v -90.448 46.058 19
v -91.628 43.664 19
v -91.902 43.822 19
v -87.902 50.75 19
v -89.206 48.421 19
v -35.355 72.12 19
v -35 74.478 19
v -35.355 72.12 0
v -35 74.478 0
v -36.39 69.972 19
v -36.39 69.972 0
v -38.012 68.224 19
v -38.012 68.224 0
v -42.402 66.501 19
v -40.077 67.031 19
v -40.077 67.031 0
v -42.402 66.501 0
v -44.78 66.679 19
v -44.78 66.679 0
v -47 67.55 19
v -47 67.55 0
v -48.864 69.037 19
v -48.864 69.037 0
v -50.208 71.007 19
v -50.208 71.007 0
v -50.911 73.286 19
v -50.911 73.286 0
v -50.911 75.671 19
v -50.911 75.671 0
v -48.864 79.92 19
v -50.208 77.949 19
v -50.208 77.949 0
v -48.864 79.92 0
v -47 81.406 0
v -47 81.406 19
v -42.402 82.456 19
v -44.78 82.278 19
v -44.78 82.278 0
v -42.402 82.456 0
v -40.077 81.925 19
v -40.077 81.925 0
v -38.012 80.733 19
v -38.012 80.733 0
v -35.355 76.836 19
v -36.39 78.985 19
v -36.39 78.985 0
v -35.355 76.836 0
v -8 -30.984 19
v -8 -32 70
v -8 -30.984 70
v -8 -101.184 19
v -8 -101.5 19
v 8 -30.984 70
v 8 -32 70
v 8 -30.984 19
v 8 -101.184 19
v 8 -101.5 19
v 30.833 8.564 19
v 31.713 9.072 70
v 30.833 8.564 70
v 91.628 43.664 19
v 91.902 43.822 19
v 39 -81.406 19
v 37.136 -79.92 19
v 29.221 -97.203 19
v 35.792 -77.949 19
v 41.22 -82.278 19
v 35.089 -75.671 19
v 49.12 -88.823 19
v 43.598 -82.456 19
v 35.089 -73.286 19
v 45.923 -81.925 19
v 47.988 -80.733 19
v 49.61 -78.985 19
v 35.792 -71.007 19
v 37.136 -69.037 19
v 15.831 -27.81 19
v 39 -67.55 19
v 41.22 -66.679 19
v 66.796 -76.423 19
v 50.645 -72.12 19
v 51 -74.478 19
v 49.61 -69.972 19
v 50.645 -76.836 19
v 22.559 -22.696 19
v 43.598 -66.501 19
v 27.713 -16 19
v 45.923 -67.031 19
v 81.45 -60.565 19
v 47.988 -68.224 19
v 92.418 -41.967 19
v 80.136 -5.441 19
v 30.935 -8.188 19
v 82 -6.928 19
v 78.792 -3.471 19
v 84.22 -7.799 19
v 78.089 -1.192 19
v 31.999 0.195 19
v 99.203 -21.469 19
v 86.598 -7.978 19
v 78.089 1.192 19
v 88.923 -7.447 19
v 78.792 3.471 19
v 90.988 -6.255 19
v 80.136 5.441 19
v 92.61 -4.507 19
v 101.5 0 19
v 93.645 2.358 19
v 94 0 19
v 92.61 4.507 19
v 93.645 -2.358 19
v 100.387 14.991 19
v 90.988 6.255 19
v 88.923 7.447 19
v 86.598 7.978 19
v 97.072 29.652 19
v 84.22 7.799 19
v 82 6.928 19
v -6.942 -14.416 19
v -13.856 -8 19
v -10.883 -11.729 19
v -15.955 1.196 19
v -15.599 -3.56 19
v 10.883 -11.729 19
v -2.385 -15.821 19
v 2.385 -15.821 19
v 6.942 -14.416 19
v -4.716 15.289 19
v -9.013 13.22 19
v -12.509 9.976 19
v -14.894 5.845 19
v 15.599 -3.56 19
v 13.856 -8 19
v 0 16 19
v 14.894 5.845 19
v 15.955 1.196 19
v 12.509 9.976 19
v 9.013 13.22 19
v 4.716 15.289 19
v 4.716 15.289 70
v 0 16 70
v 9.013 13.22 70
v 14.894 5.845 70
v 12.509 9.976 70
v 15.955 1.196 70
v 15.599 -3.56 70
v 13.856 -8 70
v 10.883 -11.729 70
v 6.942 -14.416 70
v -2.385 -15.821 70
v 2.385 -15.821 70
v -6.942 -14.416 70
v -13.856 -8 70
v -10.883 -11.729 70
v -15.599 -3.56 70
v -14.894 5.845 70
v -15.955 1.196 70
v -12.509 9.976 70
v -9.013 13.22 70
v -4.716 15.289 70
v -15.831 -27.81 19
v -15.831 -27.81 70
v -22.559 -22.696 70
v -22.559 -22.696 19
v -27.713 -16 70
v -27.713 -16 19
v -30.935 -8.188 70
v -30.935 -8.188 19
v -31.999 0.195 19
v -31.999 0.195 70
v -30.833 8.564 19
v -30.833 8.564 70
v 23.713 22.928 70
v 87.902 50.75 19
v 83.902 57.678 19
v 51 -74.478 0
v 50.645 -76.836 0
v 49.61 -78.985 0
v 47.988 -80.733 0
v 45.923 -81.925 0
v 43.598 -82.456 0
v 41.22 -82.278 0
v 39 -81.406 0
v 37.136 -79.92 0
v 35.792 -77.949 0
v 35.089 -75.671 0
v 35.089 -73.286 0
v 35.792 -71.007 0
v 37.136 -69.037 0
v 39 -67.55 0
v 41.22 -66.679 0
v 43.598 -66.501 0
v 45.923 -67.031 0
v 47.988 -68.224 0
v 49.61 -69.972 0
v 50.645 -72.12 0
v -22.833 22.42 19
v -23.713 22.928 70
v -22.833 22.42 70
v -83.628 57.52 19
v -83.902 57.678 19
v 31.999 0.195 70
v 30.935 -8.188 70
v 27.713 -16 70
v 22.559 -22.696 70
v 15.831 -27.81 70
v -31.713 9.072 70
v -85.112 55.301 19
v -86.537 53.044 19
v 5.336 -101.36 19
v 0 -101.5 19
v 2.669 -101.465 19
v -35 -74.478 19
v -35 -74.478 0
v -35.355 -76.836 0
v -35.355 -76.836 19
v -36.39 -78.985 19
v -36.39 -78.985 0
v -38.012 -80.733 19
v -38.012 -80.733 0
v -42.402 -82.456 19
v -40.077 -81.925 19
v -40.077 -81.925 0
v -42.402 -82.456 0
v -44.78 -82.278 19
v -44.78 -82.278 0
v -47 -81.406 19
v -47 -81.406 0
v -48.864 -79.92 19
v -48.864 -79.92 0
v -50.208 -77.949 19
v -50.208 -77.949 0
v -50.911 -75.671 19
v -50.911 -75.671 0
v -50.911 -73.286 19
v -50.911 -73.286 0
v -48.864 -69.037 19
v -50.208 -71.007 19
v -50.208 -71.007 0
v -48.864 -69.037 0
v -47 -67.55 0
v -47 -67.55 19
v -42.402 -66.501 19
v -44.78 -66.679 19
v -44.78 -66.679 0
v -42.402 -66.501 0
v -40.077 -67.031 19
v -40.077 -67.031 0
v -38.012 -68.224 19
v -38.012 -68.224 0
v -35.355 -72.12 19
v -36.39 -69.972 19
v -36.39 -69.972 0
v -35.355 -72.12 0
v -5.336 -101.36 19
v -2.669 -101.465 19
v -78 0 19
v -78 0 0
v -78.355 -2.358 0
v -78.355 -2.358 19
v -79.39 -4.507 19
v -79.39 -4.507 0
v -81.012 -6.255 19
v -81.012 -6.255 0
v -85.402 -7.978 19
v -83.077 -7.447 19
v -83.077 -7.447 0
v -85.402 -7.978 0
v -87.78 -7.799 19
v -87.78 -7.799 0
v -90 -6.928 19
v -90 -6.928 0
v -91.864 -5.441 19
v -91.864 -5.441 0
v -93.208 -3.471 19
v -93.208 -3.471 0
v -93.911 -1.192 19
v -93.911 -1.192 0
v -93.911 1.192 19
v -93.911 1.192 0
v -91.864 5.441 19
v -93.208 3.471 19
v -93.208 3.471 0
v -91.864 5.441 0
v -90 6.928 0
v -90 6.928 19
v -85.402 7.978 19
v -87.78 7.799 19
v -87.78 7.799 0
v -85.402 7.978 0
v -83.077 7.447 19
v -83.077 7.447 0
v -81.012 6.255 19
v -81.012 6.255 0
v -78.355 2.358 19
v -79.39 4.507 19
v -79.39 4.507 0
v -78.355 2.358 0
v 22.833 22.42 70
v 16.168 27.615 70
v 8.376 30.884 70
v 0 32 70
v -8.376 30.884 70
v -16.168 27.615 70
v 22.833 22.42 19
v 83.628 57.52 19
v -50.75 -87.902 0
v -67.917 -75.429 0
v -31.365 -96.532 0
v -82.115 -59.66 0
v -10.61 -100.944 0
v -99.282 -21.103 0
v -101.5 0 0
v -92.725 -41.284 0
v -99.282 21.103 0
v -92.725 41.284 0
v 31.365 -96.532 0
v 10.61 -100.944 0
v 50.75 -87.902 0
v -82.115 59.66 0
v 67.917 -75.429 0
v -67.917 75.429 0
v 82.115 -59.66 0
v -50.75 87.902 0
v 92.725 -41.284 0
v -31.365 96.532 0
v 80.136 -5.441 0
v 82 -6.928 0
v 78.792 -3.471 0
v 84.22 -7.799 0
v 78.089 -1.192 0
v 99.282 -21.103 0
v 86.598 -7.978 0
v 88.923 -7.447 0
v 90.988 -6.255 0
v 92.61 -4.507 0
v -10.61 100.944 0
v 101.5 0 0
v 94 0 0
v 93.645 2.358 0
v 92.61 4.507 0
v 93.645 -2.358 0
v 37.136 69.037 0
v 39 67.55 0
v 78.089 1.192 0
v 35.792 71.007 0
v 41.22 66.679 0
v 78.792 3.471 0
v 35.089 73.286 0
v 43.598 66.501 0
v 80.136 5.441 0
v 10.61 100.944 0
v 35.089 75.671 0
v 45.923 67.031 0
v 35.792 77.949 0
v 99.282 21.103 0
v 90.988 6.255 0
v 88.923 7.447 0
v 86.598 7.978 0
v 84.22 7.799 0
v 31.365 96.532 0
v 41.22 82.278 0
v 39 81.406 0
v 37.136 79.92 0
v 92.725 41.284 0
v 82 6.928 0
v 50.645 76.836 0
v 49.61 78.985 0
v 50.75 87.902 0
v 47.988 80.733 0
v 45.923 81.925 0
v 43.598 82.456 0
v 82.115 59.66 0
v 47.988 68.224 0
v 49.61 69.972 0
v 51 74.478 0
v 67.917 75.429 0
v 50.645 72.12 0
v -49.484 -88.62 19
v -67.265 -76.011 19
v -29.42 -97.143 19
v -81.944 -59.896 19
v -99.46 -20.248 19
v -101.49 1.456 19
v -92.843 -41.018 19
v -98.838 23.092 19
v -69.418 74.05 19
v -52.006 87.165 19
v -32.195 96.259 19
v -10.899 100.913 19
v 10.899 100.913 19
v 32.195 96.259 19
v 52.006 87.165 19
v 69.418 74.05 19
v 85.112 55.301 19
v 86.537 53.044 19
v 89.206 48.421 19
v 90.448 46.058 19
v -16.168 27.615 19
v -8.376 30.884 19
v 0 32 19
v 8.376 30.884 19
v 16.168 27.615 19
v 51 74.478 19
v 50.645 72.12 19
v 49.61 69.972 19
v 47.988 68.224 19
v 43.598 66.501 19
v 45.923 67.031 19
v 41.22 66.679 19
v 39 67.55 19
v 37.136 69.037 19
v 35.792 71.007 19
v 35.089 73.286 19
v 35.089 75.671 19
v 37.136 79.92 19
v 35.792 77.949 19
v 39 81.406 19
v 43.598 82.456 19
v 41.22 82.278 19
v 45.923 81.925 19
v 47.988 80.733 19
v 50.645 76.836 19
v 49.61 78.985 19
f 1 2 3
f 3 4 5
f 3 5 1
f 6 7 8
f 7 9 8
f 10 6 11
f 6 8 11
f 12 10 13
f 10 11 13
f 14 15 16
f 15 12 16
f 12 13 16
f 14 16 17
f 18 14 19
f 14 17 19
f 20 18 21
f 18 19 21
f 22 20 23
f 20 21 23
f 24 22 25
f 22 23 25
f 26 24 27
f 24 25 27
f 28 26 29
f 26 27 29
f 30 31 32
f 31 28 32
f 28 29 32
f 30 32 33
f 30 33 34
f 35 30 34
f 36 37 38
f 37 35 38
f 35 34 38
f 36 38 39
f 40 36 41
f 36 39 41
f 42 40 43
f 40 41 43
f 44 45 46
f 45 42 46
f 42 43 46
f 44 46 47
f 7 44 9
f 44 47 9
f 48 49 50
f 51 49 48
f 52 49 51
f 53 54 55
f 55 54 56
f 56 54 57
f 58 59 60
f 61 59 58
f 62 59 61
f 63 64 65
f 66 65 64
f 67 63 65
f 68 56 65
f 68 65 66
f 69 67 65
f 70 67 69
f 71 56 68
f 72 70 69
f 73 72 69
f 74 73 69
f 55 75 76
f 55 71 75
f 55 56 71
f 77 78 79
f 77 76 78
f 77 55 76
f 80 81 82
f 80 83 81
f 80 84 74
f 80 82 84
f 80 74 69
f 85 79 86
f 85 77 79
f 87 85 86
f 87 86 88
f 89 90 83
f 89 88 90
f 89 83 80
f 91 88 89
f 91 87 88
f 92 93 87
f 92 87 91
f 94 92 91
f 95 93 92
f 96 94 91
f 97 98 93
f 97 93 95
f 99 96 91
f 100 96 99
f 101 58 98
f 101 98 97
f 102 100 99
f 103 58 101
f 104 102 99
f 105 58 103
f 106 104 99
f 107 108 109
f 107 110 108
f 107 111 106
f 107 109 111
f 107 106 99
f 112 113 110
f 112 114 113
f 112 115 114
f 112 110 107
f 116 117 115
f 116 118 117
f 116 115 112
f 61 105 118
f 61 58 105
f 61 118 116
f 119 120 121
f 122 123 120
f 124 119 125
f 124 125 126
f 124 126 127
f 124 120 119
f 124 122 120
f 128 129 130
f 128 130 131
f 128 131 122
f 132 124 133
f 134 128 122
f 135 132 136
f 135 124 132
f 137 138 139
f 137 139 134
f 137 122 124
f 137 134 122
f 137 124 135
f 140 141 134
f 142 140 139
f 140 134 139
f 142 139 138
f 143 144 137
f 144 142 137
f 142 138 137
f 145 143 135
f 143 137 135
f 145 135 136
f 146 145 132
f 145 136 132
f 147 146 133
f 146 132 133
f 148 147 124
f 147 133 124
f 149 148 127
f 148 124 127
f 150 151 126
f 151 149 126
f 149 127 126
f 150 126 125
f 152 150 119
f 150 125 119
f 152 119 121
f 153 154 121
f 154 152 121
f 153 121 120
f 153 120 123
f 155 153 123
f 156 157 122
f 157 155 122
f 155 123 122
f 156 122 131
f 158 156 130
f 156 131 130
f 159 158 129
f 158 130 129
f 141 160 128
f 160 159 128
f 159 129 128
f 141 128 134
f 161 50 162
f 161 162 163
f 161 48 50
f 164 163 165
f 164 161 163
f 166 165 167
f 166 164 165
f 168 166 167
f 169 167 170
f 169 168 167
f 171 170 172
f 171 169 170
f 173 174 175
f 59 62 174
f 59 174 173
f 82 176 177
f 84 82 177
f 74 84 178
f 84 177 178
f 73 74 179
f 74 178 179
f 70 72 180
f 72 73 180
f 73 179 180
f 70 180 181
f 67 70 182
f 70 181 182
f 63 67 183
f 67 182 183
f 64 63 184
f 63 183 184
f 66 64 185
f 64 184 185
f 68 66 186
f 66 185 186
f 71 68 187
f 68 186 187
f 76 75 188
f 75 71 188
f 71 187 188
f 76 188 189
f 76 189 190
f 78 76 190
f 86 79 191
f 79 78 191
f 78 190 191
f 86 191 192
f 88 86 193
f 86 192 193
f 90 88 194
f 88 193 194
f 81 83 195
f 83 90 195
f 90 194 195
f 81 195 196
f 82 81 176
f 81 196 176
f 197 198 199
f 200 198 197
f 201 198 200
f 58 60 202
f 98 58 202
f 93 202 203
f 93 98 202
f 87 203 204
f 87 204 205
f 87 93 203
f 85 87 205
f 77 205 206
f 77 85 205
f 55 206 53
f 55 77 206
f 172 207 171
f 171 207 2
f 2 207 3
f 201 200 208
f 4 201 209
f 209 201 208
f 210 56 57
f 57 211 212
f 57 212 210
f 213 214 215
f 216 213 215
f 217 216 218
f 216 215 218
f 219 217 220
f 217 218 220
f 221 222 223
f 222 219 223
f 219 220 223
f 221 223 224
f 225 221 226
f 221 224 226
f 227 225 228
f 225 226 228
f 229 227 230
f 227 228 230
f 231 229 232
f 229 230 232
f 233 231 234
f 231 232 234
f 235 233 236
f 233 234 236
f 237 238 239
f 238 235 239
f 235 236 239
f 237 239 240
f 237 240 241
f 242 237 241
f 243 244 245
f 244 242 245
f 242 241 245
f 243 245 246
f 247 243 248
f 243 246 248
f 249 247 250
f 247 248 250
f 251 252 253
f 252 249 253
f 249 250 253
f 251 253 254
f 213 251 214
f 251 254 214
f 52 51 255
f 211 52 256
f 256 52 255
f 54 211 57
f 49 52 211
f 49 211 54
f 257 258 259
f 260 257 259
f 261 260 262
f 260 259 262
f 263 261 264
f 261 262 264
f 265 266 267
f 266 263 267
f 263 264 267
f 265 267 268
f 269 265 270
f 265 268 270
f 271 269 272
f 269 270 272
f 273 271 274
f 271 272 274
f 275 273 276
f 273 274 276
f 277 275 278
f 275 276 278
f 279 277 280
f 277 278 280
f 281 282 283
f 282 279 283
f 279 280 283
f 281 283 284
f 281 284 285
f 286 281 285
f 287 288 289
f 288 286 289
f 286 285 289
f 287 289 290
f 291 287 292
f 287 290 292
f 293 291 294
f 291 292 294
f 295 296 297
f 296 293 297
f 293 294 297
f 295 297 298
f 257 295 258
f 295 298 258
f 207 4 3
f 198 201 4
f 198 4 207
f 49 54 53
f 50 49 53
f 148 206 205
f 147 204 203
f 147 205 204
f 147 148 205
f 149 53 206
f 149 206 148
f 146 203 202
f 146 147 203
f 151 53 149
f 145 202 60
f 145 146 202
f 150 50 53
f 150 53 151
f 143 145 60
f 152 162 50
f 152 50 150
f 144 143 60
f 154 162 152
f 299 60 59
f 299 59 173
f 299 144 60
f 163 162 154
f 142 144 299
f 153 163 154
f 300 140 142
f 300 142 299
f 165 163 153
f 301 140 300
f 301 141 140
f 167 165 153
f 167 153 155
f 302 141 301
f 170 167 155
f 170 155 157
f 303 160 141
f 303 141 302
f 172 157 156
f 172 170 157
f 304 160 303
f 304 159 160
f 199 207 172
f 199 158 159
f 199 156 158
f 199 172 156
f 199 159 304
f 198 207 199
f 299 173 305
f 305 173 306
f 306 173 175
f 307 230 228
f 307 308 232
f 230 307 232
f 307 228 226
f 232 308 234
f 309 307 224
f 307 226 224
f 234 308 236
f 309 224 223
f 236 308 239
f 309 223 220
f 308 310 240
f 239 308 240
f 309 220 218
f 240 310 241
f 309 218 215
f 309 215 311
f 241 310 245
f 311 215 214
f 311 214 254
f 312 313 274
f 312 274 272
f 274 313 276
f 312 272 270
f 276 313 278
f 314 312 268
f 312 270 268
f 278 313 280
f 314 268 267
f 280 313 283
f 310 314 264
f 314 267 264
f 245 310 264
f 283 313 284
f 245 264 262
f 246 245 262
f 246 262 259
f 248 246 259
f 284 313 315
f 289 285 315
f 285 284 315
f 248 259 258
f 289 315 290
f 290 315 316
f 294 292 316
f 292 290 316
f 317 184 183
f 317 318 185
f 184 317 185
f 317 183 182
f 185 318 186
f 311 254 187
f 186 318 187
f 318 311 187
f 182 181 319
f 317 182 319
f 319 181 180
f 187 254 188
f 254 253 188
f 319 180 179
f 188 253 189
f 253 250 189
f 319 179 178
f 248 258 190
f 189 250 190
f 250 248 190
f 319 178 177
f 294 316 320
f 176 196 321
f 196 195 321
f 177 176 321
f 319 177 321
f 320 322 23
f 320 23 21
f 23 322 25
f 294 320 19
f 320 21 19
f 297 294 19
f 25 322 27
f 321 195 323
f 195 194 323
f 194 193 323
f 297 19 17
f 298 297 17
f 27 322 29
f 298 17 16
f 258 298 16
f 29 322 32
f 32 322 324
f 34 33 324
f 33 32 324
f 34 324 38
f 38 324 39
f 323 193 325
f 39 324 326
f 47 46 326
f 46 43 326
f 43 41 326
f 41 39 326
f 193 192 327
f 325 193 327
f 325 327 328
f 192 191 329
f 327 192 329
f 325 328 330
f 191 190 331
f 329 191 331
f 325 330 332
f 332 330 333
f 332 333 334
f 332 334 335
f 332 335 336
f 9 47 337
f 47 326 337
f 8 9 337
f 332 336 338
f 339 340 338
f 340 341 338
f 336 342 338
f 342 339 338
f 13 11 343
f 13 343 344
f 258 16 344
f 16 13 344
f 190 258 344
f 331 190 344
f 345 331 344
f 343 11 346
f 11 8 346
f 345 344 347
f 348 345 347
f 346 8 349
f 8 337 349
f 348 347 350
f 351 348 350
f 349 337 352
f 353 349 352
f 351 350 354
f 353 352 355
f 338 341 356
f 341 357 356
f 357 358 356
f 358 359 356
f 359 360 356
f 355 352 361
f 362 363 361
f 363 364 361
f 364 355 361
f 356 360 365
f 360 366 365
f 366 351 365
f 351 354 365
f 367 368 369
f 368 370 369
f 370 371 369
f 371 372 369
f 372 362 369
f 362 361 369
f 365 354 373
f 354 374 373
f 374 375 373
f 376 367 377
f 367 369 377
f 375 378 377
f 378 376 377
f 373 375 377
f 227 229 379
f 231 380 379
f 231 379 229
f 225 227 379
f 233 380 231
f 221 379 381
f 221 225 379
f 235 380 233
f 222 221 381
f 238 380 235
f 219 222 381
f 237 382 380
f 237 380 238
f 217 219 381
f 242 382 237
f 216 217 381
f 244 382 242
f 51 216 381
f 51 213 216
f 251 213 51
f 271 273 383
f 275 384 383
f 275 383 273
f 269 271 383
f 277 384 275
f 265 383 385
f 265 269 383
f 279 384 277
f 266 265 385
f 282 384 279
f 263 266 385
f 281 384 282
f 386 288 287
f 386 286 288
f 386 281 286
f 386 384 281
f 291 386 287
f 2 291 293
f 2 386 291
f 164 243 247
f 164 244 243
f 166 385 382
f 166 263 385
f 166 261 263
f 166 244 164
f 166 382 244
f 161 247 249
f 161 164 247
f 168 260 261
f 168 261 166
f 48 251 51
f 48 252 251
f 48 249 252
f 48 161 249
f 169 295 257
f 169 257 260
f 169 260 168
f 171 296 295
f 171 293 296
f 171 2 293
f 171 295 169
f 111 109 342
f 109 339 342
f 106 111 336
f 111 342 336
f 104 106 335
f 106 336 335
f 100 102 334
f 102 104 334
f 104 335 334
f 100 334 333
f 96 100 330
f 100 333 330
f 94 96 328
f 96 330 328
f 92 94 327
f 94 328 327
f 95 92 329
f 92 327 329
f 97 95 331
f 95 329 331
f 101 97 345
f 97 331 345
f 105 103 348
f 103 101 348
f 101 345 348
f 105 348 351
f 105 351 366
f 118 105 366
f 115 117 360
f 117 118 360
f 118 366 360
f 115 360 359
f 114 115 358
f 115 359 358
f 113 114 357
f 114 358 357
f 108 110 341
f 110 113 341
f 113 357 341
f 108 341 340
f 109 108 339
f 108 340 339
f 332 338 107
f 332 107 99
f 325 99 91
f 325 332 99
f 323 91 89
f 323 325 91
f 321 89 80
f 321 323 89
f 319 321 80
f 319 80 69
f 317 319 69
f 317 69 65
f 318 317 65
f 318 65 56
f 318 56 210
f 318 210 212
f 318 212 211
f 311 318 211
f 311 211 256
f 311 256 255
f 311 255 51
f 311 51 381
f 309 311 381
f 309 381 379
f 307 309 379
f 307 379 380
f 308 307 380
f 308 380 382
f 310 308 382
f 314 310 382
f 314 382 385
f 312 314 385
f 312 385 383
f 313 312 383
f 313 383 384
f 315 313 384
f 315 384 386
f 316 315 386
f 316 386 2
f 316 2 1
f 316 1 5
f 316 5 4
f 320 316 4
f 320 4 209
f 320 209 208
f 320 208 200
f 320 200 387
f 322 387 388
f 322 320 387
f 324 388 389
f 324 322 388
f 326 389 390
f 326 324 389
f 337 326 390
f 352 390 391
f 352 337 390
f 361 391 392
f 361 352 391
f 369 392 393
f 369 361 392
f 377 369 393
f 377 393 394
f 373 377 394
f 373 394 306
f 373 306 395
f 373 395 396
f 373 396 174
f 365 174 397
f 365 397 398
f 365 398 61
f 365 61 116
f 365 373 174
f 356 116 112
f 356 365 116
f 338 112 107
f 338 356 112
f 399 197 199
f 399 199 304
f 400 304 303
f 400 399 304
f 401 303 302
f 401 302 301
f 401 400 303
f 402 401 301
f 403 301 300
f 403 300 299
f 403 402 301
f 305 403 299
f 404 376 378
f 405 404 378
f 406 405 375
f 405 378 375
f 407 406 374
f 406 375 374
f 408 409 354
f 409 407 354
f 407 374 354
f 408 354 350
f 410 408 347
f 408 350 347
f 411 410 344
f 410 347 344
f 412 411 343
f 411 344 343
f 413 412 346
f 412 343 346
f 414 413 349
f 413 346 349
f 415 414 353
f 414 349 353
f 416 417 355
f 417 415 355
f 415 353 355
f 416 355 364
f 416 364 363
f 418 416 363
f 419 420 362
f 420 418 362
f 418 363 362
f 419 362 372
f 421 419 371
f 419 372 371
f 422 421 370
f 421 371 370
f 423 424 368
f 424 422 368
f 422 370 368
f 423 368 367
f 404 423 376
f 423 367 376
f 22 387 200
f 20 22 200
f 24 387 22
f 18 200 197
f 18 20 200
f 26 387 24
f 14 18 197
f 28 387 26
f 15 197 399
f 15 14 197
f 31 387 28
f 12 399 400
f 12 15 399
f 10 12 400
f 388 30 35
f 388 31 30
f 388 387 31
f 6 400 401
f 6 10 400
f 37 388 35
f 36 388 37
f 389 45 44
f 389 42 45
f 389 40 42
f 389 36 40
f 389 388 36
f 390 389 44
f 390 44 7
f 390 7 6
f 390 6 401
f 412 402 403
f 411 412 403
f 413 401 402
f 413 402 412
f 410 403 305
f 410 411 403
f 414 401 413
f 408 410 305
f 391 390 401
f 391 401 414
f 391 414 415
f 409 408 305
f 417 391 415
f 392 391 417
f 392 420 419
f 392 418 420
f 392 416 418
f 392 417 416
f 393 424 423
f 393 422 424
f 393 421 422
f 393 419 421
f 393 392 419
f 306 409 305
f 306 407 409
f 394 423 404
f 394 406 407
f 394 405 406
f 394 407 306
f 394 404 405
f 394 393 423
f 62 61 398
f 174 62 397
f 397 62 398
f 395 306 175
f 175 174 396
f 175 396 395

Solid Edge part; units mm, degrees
sketch "Sketch1" plane through (0, 0, 0) normal (0, 0, 1) x (1, 0, 0)
  circle A0 centre (-86, 0) radius 8
  circle A1 centre (-43, -74.4782) radius 8
  circle A2 centre (43, -74.4782) radius 8
  circle A3 centre (86, 0) radius 8
  circle A4 centre (43, 74.4782) radius 8
  circle A5 centre (-43, 74.4782) radius 8
  circle A6 centre (0, 0) radius 101.5
extrude "Protrusion1" add sketch "Sketch1" along normal blind 19
sketch "Sketch2" plane through (0, 0, 19) normal (0, 0, 1) x (0, 1, 0)
  circle A0 centre (0, 0) radius 32
  circle A1 centre (0, 0) radius 16
extrude "ExtrudedProtrusion_4" add sketch "Sketch2" along normal blind 51
sketch "Sketch3" plane through (0, 0, 0) normal (1, 0, 0) x (0, 1, 0)
  line L0 (-101.5, 19) -> (-32, 70)
  line L1 (-32, 70) -> (-30, 70)
  line L2 (-30, 70) -> (-30, 19)
  line L3 (-30, 19) -> (-101.5, 19)
extrude "ExtrudedCutout_5" cut sketch "Sketch3" along normal mid plane 16
sketch "Sketch4" plane through (0, 0, 0) normal (1, 0, 0) x (0, 1, 0)
  line L0 (-101.5, 19) -> (-32, 70)
  line L1 (-32, 70) -> (-30, 70)
  line L2 (-30, 70) -> (-30, 19)
  line L3 (-30, 19) -> (-101.5, 19)
extrude "ExtrudedProtrusion_9" add sketch "Sketch4" along normal mid plane 16
pattern_circular "Pattern1" count 3 over 360 about axis through (0, 0, 70) along (0, 0, 1) of "ExtrudedProtrusion_9"
